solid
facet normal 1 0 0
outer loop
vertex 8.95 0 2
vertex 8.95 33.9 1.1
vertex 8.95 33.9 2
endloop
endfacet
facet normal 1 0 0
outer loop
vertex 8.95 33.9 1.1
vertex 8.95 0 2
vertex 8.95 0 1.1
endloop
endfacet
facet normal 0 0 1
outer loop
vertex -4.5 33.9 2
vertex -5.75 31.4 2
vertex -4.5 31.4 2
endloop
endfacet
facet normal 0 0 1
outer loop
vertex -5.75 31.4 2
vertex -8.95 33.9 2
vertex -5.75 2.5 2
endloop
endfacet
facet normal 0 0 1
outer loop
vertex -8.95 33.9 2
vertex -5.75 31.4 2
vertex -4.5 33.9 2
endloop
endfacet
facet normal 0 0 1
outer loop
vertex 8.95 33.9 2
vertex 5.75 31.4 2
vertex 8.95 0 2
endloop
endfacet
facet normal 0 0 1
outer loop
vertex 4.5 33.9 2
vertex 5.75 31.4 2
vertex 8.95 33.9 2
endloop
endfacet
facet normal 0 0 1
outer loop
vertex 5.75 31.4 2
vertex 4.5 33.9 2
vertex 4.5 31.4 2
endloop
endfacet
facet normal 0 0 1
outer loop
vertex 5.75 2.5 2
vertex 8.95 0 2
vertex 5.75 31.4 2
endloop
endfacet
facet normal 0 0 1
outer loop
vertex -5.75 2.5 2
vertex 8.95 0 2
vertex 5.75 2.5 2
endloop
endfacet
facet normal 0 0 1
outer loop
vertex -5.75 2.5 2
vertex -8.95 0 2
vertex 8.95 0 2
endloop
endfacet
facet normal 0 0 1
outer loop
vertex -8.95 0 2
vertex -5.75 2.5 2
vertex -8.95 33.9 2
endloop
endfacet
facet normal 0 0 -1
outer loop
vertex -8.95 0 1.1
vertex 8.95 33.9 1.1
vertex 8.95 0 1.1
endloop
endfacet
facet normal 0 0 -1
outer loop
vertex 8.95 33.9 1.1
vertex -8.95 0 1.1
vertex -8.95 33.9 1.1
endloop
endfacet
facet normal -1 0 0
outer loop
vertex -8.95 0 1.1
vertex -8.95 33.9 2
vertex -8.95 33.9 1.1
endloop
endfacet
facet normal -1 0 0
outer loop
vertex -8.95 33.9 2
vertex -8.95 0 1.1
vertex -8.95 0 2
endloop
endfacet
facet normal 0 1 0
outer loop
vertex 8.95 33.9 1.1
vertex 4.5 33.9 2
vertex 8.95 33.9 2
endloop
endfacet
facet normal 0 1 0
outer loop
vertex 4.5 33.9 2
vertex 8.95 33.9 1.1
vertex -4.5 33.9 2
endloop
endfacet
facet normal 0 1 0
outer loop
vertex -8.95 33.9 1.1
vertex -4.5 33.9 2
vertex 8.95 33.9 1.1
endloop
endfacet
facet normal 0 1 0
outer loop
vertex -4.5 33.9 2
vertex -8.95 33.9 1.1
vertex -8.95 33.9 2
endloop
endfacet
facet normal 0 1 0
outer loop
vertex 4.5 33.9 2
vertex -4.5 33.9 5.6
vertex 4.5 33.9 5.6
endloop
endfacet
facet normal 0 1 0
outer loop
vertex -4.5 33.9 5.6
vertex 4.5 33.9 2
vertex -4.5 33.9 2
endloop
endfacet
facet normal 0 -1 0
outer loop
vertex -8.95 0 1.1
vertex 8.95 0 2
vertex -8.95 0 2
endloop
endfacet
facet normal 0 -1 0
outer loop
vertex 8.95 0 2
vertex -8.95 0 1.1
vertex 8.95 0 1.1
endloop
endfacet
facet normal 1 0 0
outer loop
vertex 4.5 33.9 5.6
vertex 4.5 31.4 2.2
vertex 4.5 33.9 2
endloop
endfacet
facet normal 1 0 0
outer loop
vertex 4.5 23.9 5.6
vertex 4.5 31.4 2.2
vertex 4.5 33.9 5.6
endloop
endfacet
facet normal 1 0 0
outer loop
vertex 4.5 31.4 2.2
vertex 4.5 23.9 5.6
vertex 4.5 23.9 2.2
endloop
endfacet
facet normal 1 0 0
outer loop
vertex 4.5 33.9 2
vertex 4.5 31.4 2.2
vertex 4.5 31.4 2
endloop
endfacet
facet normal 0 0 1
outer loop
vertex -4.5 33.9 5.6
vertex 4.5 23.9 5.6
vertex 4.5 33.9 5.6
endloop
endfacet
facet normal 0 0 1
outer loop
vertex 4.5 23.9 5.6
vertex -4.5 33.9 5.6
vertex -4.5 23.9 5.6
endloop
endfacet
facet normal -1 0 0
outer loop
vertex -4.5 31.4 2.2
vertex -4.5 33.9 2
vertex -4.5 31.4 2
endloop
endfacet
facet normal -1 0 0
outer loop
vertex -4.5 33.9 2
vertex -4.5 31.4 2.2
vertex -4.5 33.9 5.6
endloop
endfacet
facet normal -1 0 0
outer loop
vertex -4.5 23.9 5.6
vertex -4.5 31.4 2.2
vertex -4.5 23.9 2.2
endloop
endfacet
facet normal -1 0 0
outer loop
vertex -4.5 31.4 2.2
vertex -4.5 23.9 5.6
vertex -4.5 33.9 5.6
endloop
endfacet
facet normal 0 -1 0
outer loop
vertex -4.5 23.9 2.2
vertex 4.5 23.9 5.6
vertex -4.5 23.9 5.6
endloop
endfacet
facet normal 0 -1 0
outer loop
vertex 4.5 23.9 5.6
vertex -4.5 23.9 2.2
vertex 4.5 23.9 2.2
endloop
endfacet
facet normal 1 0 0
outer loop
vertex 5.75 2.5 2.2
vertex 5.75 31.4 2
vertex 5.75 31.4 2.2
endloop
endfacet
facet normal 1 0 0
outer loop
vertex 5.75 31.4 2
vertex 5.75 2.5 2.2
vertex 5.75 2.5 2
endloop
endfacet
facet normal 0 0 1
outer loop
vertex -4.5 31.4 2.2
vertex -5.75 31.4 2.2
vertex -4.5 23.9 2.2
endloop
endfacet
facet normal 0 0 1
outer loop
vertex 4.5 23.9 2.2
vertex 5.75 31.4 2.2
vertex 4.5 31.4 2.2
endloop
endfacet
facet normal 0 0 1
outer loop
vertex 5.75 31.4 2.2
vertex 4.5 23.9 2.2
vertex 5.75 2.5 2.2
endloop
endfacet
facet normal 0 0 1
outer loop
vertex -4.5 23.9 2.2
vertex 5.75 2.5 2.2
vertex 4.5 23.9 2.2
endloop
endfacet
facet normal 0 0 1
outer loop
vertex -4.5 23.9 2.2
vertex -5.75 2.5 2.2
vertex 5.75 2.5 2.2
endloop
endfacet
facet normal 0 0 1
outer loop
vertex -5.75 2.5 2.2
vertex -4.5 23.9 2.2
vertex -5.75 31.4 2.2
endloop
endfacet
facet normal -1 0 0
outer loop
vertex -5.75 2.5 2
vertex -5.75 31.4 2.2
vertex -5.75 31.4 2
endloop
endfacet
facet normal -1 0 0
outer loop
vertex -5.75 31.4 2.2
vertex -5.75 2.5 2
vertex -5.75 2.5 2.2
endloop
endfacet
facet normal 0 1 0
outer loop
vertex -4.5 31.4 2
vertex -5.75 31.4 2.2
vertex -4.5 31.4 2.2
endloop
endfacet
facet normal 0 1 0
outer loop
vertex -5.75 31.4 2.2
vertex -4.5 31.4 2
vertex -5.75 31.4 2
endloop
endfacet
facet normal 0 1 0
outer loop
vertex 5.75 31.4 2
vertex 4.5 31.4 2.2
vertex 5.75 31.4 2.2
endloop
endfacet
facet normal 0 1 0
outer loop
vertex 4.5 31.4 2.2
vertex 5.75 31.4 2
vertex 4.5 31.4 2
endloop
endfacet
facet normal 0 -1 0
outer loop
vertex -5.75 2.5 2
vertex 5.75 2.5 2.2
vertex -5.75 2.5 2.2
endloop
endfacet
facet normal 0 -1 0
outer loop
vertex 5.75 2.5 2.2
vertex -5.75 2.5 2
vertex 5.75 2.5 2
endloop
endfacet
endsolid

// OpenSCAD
$fn=100;

// Dimensions of the board
blength  = 33.6+0.3;
bwidth   = 17.9;
bthick   = 0.9;
bheight  = 4.5;
// Height of the USB port; measured from the bottom of 
// plate
busb     = 9;
// Width of the board minus the width of the connector
// pins
bmiddlew = 11.5;
bmiddlew2 = 5;

// Parameters for the case
// Bottom thickness
cthick = 1;
// Wall thickness
cwall = 1.5;
// Length of the wider part of the bottom at the
// front (usb) of the case
cfront = 2.4;
// Extra space for the slot at the front of the
// case
cpad = 1;


example_board = true;
if (example_board) {
  translate([0, 0, cthick+0.1])
  color("darkred") {
  translate([-bwidth/2, 0, 0])
    cube([bwidth, blength, bthick]);
  translate([-busb/2, blength-10, 0])
    cube([busb, 10, bheight]);
  translate([-bmiddlew/2, 2.5, 0])
    cube([bmiddlew, blength-5, bthick+0.2]);
  }
}


//microprocase();



module wedge(dim) {
  translate([dim[0], 0, 0])
  rotate([0, -90, 0])
  linear_extrude(dim[0])
  polygon([
    [0, 0],
    [dim[2], 0],
    [0, dim[1]]
  ]);
}

module microprocase() {
  // Bottom
  //translate([-bmiddlew/2, -cwall, 0])
  //  cube([bmiddlew, blength+cwall*2, cthick]);
  translate([-bmiddlew2/2, -cwall, 0])
    cube([bmiddlew2, blength+cwall*2, cthick]);
  
  translate([-bwidth/2, blength-cfront, 0])
    cube([bwidth, cfront+cwall, cthick]);

  // Back
  translate([-bmiddlew/2, -cwall, 0])
    cube([bmiddlew, cwall, bheight+cthick]);

  // Front
  translate([-bwidth/2, blength, 0])
    cube([(bwidth-busb)/2, cwall, bheight+cthick]);
  translate([busb/2, blength, 0])
    cube([(bwidth-busb)/2, cwall, bheight+cthick]);
  // left extension
  translate([-bwidth/2, blength-1, cthick+bthick+cpad])
    cube([(bwidth-busb)/2, 1, bheight-bthick-cpad]);
  translate([-bwidth/2, blength, cthick+bthick+cpad])
    mirror([0, 1, 1]) wedge([(bwidth-busb)/2, 1, 1]);
  // right extension
  translate([busb/2, blength-1, cthick+bthick+cpad])
    cube([(bwidth-busb)/2, 1, bheight-bthick-cpad]);
  translate([busb/2, blength, cthick+bthick+cpad])
    mirror([0, 1, 1]) wedge([(bwidth-busb)/2, 1, 1]);
  

}
